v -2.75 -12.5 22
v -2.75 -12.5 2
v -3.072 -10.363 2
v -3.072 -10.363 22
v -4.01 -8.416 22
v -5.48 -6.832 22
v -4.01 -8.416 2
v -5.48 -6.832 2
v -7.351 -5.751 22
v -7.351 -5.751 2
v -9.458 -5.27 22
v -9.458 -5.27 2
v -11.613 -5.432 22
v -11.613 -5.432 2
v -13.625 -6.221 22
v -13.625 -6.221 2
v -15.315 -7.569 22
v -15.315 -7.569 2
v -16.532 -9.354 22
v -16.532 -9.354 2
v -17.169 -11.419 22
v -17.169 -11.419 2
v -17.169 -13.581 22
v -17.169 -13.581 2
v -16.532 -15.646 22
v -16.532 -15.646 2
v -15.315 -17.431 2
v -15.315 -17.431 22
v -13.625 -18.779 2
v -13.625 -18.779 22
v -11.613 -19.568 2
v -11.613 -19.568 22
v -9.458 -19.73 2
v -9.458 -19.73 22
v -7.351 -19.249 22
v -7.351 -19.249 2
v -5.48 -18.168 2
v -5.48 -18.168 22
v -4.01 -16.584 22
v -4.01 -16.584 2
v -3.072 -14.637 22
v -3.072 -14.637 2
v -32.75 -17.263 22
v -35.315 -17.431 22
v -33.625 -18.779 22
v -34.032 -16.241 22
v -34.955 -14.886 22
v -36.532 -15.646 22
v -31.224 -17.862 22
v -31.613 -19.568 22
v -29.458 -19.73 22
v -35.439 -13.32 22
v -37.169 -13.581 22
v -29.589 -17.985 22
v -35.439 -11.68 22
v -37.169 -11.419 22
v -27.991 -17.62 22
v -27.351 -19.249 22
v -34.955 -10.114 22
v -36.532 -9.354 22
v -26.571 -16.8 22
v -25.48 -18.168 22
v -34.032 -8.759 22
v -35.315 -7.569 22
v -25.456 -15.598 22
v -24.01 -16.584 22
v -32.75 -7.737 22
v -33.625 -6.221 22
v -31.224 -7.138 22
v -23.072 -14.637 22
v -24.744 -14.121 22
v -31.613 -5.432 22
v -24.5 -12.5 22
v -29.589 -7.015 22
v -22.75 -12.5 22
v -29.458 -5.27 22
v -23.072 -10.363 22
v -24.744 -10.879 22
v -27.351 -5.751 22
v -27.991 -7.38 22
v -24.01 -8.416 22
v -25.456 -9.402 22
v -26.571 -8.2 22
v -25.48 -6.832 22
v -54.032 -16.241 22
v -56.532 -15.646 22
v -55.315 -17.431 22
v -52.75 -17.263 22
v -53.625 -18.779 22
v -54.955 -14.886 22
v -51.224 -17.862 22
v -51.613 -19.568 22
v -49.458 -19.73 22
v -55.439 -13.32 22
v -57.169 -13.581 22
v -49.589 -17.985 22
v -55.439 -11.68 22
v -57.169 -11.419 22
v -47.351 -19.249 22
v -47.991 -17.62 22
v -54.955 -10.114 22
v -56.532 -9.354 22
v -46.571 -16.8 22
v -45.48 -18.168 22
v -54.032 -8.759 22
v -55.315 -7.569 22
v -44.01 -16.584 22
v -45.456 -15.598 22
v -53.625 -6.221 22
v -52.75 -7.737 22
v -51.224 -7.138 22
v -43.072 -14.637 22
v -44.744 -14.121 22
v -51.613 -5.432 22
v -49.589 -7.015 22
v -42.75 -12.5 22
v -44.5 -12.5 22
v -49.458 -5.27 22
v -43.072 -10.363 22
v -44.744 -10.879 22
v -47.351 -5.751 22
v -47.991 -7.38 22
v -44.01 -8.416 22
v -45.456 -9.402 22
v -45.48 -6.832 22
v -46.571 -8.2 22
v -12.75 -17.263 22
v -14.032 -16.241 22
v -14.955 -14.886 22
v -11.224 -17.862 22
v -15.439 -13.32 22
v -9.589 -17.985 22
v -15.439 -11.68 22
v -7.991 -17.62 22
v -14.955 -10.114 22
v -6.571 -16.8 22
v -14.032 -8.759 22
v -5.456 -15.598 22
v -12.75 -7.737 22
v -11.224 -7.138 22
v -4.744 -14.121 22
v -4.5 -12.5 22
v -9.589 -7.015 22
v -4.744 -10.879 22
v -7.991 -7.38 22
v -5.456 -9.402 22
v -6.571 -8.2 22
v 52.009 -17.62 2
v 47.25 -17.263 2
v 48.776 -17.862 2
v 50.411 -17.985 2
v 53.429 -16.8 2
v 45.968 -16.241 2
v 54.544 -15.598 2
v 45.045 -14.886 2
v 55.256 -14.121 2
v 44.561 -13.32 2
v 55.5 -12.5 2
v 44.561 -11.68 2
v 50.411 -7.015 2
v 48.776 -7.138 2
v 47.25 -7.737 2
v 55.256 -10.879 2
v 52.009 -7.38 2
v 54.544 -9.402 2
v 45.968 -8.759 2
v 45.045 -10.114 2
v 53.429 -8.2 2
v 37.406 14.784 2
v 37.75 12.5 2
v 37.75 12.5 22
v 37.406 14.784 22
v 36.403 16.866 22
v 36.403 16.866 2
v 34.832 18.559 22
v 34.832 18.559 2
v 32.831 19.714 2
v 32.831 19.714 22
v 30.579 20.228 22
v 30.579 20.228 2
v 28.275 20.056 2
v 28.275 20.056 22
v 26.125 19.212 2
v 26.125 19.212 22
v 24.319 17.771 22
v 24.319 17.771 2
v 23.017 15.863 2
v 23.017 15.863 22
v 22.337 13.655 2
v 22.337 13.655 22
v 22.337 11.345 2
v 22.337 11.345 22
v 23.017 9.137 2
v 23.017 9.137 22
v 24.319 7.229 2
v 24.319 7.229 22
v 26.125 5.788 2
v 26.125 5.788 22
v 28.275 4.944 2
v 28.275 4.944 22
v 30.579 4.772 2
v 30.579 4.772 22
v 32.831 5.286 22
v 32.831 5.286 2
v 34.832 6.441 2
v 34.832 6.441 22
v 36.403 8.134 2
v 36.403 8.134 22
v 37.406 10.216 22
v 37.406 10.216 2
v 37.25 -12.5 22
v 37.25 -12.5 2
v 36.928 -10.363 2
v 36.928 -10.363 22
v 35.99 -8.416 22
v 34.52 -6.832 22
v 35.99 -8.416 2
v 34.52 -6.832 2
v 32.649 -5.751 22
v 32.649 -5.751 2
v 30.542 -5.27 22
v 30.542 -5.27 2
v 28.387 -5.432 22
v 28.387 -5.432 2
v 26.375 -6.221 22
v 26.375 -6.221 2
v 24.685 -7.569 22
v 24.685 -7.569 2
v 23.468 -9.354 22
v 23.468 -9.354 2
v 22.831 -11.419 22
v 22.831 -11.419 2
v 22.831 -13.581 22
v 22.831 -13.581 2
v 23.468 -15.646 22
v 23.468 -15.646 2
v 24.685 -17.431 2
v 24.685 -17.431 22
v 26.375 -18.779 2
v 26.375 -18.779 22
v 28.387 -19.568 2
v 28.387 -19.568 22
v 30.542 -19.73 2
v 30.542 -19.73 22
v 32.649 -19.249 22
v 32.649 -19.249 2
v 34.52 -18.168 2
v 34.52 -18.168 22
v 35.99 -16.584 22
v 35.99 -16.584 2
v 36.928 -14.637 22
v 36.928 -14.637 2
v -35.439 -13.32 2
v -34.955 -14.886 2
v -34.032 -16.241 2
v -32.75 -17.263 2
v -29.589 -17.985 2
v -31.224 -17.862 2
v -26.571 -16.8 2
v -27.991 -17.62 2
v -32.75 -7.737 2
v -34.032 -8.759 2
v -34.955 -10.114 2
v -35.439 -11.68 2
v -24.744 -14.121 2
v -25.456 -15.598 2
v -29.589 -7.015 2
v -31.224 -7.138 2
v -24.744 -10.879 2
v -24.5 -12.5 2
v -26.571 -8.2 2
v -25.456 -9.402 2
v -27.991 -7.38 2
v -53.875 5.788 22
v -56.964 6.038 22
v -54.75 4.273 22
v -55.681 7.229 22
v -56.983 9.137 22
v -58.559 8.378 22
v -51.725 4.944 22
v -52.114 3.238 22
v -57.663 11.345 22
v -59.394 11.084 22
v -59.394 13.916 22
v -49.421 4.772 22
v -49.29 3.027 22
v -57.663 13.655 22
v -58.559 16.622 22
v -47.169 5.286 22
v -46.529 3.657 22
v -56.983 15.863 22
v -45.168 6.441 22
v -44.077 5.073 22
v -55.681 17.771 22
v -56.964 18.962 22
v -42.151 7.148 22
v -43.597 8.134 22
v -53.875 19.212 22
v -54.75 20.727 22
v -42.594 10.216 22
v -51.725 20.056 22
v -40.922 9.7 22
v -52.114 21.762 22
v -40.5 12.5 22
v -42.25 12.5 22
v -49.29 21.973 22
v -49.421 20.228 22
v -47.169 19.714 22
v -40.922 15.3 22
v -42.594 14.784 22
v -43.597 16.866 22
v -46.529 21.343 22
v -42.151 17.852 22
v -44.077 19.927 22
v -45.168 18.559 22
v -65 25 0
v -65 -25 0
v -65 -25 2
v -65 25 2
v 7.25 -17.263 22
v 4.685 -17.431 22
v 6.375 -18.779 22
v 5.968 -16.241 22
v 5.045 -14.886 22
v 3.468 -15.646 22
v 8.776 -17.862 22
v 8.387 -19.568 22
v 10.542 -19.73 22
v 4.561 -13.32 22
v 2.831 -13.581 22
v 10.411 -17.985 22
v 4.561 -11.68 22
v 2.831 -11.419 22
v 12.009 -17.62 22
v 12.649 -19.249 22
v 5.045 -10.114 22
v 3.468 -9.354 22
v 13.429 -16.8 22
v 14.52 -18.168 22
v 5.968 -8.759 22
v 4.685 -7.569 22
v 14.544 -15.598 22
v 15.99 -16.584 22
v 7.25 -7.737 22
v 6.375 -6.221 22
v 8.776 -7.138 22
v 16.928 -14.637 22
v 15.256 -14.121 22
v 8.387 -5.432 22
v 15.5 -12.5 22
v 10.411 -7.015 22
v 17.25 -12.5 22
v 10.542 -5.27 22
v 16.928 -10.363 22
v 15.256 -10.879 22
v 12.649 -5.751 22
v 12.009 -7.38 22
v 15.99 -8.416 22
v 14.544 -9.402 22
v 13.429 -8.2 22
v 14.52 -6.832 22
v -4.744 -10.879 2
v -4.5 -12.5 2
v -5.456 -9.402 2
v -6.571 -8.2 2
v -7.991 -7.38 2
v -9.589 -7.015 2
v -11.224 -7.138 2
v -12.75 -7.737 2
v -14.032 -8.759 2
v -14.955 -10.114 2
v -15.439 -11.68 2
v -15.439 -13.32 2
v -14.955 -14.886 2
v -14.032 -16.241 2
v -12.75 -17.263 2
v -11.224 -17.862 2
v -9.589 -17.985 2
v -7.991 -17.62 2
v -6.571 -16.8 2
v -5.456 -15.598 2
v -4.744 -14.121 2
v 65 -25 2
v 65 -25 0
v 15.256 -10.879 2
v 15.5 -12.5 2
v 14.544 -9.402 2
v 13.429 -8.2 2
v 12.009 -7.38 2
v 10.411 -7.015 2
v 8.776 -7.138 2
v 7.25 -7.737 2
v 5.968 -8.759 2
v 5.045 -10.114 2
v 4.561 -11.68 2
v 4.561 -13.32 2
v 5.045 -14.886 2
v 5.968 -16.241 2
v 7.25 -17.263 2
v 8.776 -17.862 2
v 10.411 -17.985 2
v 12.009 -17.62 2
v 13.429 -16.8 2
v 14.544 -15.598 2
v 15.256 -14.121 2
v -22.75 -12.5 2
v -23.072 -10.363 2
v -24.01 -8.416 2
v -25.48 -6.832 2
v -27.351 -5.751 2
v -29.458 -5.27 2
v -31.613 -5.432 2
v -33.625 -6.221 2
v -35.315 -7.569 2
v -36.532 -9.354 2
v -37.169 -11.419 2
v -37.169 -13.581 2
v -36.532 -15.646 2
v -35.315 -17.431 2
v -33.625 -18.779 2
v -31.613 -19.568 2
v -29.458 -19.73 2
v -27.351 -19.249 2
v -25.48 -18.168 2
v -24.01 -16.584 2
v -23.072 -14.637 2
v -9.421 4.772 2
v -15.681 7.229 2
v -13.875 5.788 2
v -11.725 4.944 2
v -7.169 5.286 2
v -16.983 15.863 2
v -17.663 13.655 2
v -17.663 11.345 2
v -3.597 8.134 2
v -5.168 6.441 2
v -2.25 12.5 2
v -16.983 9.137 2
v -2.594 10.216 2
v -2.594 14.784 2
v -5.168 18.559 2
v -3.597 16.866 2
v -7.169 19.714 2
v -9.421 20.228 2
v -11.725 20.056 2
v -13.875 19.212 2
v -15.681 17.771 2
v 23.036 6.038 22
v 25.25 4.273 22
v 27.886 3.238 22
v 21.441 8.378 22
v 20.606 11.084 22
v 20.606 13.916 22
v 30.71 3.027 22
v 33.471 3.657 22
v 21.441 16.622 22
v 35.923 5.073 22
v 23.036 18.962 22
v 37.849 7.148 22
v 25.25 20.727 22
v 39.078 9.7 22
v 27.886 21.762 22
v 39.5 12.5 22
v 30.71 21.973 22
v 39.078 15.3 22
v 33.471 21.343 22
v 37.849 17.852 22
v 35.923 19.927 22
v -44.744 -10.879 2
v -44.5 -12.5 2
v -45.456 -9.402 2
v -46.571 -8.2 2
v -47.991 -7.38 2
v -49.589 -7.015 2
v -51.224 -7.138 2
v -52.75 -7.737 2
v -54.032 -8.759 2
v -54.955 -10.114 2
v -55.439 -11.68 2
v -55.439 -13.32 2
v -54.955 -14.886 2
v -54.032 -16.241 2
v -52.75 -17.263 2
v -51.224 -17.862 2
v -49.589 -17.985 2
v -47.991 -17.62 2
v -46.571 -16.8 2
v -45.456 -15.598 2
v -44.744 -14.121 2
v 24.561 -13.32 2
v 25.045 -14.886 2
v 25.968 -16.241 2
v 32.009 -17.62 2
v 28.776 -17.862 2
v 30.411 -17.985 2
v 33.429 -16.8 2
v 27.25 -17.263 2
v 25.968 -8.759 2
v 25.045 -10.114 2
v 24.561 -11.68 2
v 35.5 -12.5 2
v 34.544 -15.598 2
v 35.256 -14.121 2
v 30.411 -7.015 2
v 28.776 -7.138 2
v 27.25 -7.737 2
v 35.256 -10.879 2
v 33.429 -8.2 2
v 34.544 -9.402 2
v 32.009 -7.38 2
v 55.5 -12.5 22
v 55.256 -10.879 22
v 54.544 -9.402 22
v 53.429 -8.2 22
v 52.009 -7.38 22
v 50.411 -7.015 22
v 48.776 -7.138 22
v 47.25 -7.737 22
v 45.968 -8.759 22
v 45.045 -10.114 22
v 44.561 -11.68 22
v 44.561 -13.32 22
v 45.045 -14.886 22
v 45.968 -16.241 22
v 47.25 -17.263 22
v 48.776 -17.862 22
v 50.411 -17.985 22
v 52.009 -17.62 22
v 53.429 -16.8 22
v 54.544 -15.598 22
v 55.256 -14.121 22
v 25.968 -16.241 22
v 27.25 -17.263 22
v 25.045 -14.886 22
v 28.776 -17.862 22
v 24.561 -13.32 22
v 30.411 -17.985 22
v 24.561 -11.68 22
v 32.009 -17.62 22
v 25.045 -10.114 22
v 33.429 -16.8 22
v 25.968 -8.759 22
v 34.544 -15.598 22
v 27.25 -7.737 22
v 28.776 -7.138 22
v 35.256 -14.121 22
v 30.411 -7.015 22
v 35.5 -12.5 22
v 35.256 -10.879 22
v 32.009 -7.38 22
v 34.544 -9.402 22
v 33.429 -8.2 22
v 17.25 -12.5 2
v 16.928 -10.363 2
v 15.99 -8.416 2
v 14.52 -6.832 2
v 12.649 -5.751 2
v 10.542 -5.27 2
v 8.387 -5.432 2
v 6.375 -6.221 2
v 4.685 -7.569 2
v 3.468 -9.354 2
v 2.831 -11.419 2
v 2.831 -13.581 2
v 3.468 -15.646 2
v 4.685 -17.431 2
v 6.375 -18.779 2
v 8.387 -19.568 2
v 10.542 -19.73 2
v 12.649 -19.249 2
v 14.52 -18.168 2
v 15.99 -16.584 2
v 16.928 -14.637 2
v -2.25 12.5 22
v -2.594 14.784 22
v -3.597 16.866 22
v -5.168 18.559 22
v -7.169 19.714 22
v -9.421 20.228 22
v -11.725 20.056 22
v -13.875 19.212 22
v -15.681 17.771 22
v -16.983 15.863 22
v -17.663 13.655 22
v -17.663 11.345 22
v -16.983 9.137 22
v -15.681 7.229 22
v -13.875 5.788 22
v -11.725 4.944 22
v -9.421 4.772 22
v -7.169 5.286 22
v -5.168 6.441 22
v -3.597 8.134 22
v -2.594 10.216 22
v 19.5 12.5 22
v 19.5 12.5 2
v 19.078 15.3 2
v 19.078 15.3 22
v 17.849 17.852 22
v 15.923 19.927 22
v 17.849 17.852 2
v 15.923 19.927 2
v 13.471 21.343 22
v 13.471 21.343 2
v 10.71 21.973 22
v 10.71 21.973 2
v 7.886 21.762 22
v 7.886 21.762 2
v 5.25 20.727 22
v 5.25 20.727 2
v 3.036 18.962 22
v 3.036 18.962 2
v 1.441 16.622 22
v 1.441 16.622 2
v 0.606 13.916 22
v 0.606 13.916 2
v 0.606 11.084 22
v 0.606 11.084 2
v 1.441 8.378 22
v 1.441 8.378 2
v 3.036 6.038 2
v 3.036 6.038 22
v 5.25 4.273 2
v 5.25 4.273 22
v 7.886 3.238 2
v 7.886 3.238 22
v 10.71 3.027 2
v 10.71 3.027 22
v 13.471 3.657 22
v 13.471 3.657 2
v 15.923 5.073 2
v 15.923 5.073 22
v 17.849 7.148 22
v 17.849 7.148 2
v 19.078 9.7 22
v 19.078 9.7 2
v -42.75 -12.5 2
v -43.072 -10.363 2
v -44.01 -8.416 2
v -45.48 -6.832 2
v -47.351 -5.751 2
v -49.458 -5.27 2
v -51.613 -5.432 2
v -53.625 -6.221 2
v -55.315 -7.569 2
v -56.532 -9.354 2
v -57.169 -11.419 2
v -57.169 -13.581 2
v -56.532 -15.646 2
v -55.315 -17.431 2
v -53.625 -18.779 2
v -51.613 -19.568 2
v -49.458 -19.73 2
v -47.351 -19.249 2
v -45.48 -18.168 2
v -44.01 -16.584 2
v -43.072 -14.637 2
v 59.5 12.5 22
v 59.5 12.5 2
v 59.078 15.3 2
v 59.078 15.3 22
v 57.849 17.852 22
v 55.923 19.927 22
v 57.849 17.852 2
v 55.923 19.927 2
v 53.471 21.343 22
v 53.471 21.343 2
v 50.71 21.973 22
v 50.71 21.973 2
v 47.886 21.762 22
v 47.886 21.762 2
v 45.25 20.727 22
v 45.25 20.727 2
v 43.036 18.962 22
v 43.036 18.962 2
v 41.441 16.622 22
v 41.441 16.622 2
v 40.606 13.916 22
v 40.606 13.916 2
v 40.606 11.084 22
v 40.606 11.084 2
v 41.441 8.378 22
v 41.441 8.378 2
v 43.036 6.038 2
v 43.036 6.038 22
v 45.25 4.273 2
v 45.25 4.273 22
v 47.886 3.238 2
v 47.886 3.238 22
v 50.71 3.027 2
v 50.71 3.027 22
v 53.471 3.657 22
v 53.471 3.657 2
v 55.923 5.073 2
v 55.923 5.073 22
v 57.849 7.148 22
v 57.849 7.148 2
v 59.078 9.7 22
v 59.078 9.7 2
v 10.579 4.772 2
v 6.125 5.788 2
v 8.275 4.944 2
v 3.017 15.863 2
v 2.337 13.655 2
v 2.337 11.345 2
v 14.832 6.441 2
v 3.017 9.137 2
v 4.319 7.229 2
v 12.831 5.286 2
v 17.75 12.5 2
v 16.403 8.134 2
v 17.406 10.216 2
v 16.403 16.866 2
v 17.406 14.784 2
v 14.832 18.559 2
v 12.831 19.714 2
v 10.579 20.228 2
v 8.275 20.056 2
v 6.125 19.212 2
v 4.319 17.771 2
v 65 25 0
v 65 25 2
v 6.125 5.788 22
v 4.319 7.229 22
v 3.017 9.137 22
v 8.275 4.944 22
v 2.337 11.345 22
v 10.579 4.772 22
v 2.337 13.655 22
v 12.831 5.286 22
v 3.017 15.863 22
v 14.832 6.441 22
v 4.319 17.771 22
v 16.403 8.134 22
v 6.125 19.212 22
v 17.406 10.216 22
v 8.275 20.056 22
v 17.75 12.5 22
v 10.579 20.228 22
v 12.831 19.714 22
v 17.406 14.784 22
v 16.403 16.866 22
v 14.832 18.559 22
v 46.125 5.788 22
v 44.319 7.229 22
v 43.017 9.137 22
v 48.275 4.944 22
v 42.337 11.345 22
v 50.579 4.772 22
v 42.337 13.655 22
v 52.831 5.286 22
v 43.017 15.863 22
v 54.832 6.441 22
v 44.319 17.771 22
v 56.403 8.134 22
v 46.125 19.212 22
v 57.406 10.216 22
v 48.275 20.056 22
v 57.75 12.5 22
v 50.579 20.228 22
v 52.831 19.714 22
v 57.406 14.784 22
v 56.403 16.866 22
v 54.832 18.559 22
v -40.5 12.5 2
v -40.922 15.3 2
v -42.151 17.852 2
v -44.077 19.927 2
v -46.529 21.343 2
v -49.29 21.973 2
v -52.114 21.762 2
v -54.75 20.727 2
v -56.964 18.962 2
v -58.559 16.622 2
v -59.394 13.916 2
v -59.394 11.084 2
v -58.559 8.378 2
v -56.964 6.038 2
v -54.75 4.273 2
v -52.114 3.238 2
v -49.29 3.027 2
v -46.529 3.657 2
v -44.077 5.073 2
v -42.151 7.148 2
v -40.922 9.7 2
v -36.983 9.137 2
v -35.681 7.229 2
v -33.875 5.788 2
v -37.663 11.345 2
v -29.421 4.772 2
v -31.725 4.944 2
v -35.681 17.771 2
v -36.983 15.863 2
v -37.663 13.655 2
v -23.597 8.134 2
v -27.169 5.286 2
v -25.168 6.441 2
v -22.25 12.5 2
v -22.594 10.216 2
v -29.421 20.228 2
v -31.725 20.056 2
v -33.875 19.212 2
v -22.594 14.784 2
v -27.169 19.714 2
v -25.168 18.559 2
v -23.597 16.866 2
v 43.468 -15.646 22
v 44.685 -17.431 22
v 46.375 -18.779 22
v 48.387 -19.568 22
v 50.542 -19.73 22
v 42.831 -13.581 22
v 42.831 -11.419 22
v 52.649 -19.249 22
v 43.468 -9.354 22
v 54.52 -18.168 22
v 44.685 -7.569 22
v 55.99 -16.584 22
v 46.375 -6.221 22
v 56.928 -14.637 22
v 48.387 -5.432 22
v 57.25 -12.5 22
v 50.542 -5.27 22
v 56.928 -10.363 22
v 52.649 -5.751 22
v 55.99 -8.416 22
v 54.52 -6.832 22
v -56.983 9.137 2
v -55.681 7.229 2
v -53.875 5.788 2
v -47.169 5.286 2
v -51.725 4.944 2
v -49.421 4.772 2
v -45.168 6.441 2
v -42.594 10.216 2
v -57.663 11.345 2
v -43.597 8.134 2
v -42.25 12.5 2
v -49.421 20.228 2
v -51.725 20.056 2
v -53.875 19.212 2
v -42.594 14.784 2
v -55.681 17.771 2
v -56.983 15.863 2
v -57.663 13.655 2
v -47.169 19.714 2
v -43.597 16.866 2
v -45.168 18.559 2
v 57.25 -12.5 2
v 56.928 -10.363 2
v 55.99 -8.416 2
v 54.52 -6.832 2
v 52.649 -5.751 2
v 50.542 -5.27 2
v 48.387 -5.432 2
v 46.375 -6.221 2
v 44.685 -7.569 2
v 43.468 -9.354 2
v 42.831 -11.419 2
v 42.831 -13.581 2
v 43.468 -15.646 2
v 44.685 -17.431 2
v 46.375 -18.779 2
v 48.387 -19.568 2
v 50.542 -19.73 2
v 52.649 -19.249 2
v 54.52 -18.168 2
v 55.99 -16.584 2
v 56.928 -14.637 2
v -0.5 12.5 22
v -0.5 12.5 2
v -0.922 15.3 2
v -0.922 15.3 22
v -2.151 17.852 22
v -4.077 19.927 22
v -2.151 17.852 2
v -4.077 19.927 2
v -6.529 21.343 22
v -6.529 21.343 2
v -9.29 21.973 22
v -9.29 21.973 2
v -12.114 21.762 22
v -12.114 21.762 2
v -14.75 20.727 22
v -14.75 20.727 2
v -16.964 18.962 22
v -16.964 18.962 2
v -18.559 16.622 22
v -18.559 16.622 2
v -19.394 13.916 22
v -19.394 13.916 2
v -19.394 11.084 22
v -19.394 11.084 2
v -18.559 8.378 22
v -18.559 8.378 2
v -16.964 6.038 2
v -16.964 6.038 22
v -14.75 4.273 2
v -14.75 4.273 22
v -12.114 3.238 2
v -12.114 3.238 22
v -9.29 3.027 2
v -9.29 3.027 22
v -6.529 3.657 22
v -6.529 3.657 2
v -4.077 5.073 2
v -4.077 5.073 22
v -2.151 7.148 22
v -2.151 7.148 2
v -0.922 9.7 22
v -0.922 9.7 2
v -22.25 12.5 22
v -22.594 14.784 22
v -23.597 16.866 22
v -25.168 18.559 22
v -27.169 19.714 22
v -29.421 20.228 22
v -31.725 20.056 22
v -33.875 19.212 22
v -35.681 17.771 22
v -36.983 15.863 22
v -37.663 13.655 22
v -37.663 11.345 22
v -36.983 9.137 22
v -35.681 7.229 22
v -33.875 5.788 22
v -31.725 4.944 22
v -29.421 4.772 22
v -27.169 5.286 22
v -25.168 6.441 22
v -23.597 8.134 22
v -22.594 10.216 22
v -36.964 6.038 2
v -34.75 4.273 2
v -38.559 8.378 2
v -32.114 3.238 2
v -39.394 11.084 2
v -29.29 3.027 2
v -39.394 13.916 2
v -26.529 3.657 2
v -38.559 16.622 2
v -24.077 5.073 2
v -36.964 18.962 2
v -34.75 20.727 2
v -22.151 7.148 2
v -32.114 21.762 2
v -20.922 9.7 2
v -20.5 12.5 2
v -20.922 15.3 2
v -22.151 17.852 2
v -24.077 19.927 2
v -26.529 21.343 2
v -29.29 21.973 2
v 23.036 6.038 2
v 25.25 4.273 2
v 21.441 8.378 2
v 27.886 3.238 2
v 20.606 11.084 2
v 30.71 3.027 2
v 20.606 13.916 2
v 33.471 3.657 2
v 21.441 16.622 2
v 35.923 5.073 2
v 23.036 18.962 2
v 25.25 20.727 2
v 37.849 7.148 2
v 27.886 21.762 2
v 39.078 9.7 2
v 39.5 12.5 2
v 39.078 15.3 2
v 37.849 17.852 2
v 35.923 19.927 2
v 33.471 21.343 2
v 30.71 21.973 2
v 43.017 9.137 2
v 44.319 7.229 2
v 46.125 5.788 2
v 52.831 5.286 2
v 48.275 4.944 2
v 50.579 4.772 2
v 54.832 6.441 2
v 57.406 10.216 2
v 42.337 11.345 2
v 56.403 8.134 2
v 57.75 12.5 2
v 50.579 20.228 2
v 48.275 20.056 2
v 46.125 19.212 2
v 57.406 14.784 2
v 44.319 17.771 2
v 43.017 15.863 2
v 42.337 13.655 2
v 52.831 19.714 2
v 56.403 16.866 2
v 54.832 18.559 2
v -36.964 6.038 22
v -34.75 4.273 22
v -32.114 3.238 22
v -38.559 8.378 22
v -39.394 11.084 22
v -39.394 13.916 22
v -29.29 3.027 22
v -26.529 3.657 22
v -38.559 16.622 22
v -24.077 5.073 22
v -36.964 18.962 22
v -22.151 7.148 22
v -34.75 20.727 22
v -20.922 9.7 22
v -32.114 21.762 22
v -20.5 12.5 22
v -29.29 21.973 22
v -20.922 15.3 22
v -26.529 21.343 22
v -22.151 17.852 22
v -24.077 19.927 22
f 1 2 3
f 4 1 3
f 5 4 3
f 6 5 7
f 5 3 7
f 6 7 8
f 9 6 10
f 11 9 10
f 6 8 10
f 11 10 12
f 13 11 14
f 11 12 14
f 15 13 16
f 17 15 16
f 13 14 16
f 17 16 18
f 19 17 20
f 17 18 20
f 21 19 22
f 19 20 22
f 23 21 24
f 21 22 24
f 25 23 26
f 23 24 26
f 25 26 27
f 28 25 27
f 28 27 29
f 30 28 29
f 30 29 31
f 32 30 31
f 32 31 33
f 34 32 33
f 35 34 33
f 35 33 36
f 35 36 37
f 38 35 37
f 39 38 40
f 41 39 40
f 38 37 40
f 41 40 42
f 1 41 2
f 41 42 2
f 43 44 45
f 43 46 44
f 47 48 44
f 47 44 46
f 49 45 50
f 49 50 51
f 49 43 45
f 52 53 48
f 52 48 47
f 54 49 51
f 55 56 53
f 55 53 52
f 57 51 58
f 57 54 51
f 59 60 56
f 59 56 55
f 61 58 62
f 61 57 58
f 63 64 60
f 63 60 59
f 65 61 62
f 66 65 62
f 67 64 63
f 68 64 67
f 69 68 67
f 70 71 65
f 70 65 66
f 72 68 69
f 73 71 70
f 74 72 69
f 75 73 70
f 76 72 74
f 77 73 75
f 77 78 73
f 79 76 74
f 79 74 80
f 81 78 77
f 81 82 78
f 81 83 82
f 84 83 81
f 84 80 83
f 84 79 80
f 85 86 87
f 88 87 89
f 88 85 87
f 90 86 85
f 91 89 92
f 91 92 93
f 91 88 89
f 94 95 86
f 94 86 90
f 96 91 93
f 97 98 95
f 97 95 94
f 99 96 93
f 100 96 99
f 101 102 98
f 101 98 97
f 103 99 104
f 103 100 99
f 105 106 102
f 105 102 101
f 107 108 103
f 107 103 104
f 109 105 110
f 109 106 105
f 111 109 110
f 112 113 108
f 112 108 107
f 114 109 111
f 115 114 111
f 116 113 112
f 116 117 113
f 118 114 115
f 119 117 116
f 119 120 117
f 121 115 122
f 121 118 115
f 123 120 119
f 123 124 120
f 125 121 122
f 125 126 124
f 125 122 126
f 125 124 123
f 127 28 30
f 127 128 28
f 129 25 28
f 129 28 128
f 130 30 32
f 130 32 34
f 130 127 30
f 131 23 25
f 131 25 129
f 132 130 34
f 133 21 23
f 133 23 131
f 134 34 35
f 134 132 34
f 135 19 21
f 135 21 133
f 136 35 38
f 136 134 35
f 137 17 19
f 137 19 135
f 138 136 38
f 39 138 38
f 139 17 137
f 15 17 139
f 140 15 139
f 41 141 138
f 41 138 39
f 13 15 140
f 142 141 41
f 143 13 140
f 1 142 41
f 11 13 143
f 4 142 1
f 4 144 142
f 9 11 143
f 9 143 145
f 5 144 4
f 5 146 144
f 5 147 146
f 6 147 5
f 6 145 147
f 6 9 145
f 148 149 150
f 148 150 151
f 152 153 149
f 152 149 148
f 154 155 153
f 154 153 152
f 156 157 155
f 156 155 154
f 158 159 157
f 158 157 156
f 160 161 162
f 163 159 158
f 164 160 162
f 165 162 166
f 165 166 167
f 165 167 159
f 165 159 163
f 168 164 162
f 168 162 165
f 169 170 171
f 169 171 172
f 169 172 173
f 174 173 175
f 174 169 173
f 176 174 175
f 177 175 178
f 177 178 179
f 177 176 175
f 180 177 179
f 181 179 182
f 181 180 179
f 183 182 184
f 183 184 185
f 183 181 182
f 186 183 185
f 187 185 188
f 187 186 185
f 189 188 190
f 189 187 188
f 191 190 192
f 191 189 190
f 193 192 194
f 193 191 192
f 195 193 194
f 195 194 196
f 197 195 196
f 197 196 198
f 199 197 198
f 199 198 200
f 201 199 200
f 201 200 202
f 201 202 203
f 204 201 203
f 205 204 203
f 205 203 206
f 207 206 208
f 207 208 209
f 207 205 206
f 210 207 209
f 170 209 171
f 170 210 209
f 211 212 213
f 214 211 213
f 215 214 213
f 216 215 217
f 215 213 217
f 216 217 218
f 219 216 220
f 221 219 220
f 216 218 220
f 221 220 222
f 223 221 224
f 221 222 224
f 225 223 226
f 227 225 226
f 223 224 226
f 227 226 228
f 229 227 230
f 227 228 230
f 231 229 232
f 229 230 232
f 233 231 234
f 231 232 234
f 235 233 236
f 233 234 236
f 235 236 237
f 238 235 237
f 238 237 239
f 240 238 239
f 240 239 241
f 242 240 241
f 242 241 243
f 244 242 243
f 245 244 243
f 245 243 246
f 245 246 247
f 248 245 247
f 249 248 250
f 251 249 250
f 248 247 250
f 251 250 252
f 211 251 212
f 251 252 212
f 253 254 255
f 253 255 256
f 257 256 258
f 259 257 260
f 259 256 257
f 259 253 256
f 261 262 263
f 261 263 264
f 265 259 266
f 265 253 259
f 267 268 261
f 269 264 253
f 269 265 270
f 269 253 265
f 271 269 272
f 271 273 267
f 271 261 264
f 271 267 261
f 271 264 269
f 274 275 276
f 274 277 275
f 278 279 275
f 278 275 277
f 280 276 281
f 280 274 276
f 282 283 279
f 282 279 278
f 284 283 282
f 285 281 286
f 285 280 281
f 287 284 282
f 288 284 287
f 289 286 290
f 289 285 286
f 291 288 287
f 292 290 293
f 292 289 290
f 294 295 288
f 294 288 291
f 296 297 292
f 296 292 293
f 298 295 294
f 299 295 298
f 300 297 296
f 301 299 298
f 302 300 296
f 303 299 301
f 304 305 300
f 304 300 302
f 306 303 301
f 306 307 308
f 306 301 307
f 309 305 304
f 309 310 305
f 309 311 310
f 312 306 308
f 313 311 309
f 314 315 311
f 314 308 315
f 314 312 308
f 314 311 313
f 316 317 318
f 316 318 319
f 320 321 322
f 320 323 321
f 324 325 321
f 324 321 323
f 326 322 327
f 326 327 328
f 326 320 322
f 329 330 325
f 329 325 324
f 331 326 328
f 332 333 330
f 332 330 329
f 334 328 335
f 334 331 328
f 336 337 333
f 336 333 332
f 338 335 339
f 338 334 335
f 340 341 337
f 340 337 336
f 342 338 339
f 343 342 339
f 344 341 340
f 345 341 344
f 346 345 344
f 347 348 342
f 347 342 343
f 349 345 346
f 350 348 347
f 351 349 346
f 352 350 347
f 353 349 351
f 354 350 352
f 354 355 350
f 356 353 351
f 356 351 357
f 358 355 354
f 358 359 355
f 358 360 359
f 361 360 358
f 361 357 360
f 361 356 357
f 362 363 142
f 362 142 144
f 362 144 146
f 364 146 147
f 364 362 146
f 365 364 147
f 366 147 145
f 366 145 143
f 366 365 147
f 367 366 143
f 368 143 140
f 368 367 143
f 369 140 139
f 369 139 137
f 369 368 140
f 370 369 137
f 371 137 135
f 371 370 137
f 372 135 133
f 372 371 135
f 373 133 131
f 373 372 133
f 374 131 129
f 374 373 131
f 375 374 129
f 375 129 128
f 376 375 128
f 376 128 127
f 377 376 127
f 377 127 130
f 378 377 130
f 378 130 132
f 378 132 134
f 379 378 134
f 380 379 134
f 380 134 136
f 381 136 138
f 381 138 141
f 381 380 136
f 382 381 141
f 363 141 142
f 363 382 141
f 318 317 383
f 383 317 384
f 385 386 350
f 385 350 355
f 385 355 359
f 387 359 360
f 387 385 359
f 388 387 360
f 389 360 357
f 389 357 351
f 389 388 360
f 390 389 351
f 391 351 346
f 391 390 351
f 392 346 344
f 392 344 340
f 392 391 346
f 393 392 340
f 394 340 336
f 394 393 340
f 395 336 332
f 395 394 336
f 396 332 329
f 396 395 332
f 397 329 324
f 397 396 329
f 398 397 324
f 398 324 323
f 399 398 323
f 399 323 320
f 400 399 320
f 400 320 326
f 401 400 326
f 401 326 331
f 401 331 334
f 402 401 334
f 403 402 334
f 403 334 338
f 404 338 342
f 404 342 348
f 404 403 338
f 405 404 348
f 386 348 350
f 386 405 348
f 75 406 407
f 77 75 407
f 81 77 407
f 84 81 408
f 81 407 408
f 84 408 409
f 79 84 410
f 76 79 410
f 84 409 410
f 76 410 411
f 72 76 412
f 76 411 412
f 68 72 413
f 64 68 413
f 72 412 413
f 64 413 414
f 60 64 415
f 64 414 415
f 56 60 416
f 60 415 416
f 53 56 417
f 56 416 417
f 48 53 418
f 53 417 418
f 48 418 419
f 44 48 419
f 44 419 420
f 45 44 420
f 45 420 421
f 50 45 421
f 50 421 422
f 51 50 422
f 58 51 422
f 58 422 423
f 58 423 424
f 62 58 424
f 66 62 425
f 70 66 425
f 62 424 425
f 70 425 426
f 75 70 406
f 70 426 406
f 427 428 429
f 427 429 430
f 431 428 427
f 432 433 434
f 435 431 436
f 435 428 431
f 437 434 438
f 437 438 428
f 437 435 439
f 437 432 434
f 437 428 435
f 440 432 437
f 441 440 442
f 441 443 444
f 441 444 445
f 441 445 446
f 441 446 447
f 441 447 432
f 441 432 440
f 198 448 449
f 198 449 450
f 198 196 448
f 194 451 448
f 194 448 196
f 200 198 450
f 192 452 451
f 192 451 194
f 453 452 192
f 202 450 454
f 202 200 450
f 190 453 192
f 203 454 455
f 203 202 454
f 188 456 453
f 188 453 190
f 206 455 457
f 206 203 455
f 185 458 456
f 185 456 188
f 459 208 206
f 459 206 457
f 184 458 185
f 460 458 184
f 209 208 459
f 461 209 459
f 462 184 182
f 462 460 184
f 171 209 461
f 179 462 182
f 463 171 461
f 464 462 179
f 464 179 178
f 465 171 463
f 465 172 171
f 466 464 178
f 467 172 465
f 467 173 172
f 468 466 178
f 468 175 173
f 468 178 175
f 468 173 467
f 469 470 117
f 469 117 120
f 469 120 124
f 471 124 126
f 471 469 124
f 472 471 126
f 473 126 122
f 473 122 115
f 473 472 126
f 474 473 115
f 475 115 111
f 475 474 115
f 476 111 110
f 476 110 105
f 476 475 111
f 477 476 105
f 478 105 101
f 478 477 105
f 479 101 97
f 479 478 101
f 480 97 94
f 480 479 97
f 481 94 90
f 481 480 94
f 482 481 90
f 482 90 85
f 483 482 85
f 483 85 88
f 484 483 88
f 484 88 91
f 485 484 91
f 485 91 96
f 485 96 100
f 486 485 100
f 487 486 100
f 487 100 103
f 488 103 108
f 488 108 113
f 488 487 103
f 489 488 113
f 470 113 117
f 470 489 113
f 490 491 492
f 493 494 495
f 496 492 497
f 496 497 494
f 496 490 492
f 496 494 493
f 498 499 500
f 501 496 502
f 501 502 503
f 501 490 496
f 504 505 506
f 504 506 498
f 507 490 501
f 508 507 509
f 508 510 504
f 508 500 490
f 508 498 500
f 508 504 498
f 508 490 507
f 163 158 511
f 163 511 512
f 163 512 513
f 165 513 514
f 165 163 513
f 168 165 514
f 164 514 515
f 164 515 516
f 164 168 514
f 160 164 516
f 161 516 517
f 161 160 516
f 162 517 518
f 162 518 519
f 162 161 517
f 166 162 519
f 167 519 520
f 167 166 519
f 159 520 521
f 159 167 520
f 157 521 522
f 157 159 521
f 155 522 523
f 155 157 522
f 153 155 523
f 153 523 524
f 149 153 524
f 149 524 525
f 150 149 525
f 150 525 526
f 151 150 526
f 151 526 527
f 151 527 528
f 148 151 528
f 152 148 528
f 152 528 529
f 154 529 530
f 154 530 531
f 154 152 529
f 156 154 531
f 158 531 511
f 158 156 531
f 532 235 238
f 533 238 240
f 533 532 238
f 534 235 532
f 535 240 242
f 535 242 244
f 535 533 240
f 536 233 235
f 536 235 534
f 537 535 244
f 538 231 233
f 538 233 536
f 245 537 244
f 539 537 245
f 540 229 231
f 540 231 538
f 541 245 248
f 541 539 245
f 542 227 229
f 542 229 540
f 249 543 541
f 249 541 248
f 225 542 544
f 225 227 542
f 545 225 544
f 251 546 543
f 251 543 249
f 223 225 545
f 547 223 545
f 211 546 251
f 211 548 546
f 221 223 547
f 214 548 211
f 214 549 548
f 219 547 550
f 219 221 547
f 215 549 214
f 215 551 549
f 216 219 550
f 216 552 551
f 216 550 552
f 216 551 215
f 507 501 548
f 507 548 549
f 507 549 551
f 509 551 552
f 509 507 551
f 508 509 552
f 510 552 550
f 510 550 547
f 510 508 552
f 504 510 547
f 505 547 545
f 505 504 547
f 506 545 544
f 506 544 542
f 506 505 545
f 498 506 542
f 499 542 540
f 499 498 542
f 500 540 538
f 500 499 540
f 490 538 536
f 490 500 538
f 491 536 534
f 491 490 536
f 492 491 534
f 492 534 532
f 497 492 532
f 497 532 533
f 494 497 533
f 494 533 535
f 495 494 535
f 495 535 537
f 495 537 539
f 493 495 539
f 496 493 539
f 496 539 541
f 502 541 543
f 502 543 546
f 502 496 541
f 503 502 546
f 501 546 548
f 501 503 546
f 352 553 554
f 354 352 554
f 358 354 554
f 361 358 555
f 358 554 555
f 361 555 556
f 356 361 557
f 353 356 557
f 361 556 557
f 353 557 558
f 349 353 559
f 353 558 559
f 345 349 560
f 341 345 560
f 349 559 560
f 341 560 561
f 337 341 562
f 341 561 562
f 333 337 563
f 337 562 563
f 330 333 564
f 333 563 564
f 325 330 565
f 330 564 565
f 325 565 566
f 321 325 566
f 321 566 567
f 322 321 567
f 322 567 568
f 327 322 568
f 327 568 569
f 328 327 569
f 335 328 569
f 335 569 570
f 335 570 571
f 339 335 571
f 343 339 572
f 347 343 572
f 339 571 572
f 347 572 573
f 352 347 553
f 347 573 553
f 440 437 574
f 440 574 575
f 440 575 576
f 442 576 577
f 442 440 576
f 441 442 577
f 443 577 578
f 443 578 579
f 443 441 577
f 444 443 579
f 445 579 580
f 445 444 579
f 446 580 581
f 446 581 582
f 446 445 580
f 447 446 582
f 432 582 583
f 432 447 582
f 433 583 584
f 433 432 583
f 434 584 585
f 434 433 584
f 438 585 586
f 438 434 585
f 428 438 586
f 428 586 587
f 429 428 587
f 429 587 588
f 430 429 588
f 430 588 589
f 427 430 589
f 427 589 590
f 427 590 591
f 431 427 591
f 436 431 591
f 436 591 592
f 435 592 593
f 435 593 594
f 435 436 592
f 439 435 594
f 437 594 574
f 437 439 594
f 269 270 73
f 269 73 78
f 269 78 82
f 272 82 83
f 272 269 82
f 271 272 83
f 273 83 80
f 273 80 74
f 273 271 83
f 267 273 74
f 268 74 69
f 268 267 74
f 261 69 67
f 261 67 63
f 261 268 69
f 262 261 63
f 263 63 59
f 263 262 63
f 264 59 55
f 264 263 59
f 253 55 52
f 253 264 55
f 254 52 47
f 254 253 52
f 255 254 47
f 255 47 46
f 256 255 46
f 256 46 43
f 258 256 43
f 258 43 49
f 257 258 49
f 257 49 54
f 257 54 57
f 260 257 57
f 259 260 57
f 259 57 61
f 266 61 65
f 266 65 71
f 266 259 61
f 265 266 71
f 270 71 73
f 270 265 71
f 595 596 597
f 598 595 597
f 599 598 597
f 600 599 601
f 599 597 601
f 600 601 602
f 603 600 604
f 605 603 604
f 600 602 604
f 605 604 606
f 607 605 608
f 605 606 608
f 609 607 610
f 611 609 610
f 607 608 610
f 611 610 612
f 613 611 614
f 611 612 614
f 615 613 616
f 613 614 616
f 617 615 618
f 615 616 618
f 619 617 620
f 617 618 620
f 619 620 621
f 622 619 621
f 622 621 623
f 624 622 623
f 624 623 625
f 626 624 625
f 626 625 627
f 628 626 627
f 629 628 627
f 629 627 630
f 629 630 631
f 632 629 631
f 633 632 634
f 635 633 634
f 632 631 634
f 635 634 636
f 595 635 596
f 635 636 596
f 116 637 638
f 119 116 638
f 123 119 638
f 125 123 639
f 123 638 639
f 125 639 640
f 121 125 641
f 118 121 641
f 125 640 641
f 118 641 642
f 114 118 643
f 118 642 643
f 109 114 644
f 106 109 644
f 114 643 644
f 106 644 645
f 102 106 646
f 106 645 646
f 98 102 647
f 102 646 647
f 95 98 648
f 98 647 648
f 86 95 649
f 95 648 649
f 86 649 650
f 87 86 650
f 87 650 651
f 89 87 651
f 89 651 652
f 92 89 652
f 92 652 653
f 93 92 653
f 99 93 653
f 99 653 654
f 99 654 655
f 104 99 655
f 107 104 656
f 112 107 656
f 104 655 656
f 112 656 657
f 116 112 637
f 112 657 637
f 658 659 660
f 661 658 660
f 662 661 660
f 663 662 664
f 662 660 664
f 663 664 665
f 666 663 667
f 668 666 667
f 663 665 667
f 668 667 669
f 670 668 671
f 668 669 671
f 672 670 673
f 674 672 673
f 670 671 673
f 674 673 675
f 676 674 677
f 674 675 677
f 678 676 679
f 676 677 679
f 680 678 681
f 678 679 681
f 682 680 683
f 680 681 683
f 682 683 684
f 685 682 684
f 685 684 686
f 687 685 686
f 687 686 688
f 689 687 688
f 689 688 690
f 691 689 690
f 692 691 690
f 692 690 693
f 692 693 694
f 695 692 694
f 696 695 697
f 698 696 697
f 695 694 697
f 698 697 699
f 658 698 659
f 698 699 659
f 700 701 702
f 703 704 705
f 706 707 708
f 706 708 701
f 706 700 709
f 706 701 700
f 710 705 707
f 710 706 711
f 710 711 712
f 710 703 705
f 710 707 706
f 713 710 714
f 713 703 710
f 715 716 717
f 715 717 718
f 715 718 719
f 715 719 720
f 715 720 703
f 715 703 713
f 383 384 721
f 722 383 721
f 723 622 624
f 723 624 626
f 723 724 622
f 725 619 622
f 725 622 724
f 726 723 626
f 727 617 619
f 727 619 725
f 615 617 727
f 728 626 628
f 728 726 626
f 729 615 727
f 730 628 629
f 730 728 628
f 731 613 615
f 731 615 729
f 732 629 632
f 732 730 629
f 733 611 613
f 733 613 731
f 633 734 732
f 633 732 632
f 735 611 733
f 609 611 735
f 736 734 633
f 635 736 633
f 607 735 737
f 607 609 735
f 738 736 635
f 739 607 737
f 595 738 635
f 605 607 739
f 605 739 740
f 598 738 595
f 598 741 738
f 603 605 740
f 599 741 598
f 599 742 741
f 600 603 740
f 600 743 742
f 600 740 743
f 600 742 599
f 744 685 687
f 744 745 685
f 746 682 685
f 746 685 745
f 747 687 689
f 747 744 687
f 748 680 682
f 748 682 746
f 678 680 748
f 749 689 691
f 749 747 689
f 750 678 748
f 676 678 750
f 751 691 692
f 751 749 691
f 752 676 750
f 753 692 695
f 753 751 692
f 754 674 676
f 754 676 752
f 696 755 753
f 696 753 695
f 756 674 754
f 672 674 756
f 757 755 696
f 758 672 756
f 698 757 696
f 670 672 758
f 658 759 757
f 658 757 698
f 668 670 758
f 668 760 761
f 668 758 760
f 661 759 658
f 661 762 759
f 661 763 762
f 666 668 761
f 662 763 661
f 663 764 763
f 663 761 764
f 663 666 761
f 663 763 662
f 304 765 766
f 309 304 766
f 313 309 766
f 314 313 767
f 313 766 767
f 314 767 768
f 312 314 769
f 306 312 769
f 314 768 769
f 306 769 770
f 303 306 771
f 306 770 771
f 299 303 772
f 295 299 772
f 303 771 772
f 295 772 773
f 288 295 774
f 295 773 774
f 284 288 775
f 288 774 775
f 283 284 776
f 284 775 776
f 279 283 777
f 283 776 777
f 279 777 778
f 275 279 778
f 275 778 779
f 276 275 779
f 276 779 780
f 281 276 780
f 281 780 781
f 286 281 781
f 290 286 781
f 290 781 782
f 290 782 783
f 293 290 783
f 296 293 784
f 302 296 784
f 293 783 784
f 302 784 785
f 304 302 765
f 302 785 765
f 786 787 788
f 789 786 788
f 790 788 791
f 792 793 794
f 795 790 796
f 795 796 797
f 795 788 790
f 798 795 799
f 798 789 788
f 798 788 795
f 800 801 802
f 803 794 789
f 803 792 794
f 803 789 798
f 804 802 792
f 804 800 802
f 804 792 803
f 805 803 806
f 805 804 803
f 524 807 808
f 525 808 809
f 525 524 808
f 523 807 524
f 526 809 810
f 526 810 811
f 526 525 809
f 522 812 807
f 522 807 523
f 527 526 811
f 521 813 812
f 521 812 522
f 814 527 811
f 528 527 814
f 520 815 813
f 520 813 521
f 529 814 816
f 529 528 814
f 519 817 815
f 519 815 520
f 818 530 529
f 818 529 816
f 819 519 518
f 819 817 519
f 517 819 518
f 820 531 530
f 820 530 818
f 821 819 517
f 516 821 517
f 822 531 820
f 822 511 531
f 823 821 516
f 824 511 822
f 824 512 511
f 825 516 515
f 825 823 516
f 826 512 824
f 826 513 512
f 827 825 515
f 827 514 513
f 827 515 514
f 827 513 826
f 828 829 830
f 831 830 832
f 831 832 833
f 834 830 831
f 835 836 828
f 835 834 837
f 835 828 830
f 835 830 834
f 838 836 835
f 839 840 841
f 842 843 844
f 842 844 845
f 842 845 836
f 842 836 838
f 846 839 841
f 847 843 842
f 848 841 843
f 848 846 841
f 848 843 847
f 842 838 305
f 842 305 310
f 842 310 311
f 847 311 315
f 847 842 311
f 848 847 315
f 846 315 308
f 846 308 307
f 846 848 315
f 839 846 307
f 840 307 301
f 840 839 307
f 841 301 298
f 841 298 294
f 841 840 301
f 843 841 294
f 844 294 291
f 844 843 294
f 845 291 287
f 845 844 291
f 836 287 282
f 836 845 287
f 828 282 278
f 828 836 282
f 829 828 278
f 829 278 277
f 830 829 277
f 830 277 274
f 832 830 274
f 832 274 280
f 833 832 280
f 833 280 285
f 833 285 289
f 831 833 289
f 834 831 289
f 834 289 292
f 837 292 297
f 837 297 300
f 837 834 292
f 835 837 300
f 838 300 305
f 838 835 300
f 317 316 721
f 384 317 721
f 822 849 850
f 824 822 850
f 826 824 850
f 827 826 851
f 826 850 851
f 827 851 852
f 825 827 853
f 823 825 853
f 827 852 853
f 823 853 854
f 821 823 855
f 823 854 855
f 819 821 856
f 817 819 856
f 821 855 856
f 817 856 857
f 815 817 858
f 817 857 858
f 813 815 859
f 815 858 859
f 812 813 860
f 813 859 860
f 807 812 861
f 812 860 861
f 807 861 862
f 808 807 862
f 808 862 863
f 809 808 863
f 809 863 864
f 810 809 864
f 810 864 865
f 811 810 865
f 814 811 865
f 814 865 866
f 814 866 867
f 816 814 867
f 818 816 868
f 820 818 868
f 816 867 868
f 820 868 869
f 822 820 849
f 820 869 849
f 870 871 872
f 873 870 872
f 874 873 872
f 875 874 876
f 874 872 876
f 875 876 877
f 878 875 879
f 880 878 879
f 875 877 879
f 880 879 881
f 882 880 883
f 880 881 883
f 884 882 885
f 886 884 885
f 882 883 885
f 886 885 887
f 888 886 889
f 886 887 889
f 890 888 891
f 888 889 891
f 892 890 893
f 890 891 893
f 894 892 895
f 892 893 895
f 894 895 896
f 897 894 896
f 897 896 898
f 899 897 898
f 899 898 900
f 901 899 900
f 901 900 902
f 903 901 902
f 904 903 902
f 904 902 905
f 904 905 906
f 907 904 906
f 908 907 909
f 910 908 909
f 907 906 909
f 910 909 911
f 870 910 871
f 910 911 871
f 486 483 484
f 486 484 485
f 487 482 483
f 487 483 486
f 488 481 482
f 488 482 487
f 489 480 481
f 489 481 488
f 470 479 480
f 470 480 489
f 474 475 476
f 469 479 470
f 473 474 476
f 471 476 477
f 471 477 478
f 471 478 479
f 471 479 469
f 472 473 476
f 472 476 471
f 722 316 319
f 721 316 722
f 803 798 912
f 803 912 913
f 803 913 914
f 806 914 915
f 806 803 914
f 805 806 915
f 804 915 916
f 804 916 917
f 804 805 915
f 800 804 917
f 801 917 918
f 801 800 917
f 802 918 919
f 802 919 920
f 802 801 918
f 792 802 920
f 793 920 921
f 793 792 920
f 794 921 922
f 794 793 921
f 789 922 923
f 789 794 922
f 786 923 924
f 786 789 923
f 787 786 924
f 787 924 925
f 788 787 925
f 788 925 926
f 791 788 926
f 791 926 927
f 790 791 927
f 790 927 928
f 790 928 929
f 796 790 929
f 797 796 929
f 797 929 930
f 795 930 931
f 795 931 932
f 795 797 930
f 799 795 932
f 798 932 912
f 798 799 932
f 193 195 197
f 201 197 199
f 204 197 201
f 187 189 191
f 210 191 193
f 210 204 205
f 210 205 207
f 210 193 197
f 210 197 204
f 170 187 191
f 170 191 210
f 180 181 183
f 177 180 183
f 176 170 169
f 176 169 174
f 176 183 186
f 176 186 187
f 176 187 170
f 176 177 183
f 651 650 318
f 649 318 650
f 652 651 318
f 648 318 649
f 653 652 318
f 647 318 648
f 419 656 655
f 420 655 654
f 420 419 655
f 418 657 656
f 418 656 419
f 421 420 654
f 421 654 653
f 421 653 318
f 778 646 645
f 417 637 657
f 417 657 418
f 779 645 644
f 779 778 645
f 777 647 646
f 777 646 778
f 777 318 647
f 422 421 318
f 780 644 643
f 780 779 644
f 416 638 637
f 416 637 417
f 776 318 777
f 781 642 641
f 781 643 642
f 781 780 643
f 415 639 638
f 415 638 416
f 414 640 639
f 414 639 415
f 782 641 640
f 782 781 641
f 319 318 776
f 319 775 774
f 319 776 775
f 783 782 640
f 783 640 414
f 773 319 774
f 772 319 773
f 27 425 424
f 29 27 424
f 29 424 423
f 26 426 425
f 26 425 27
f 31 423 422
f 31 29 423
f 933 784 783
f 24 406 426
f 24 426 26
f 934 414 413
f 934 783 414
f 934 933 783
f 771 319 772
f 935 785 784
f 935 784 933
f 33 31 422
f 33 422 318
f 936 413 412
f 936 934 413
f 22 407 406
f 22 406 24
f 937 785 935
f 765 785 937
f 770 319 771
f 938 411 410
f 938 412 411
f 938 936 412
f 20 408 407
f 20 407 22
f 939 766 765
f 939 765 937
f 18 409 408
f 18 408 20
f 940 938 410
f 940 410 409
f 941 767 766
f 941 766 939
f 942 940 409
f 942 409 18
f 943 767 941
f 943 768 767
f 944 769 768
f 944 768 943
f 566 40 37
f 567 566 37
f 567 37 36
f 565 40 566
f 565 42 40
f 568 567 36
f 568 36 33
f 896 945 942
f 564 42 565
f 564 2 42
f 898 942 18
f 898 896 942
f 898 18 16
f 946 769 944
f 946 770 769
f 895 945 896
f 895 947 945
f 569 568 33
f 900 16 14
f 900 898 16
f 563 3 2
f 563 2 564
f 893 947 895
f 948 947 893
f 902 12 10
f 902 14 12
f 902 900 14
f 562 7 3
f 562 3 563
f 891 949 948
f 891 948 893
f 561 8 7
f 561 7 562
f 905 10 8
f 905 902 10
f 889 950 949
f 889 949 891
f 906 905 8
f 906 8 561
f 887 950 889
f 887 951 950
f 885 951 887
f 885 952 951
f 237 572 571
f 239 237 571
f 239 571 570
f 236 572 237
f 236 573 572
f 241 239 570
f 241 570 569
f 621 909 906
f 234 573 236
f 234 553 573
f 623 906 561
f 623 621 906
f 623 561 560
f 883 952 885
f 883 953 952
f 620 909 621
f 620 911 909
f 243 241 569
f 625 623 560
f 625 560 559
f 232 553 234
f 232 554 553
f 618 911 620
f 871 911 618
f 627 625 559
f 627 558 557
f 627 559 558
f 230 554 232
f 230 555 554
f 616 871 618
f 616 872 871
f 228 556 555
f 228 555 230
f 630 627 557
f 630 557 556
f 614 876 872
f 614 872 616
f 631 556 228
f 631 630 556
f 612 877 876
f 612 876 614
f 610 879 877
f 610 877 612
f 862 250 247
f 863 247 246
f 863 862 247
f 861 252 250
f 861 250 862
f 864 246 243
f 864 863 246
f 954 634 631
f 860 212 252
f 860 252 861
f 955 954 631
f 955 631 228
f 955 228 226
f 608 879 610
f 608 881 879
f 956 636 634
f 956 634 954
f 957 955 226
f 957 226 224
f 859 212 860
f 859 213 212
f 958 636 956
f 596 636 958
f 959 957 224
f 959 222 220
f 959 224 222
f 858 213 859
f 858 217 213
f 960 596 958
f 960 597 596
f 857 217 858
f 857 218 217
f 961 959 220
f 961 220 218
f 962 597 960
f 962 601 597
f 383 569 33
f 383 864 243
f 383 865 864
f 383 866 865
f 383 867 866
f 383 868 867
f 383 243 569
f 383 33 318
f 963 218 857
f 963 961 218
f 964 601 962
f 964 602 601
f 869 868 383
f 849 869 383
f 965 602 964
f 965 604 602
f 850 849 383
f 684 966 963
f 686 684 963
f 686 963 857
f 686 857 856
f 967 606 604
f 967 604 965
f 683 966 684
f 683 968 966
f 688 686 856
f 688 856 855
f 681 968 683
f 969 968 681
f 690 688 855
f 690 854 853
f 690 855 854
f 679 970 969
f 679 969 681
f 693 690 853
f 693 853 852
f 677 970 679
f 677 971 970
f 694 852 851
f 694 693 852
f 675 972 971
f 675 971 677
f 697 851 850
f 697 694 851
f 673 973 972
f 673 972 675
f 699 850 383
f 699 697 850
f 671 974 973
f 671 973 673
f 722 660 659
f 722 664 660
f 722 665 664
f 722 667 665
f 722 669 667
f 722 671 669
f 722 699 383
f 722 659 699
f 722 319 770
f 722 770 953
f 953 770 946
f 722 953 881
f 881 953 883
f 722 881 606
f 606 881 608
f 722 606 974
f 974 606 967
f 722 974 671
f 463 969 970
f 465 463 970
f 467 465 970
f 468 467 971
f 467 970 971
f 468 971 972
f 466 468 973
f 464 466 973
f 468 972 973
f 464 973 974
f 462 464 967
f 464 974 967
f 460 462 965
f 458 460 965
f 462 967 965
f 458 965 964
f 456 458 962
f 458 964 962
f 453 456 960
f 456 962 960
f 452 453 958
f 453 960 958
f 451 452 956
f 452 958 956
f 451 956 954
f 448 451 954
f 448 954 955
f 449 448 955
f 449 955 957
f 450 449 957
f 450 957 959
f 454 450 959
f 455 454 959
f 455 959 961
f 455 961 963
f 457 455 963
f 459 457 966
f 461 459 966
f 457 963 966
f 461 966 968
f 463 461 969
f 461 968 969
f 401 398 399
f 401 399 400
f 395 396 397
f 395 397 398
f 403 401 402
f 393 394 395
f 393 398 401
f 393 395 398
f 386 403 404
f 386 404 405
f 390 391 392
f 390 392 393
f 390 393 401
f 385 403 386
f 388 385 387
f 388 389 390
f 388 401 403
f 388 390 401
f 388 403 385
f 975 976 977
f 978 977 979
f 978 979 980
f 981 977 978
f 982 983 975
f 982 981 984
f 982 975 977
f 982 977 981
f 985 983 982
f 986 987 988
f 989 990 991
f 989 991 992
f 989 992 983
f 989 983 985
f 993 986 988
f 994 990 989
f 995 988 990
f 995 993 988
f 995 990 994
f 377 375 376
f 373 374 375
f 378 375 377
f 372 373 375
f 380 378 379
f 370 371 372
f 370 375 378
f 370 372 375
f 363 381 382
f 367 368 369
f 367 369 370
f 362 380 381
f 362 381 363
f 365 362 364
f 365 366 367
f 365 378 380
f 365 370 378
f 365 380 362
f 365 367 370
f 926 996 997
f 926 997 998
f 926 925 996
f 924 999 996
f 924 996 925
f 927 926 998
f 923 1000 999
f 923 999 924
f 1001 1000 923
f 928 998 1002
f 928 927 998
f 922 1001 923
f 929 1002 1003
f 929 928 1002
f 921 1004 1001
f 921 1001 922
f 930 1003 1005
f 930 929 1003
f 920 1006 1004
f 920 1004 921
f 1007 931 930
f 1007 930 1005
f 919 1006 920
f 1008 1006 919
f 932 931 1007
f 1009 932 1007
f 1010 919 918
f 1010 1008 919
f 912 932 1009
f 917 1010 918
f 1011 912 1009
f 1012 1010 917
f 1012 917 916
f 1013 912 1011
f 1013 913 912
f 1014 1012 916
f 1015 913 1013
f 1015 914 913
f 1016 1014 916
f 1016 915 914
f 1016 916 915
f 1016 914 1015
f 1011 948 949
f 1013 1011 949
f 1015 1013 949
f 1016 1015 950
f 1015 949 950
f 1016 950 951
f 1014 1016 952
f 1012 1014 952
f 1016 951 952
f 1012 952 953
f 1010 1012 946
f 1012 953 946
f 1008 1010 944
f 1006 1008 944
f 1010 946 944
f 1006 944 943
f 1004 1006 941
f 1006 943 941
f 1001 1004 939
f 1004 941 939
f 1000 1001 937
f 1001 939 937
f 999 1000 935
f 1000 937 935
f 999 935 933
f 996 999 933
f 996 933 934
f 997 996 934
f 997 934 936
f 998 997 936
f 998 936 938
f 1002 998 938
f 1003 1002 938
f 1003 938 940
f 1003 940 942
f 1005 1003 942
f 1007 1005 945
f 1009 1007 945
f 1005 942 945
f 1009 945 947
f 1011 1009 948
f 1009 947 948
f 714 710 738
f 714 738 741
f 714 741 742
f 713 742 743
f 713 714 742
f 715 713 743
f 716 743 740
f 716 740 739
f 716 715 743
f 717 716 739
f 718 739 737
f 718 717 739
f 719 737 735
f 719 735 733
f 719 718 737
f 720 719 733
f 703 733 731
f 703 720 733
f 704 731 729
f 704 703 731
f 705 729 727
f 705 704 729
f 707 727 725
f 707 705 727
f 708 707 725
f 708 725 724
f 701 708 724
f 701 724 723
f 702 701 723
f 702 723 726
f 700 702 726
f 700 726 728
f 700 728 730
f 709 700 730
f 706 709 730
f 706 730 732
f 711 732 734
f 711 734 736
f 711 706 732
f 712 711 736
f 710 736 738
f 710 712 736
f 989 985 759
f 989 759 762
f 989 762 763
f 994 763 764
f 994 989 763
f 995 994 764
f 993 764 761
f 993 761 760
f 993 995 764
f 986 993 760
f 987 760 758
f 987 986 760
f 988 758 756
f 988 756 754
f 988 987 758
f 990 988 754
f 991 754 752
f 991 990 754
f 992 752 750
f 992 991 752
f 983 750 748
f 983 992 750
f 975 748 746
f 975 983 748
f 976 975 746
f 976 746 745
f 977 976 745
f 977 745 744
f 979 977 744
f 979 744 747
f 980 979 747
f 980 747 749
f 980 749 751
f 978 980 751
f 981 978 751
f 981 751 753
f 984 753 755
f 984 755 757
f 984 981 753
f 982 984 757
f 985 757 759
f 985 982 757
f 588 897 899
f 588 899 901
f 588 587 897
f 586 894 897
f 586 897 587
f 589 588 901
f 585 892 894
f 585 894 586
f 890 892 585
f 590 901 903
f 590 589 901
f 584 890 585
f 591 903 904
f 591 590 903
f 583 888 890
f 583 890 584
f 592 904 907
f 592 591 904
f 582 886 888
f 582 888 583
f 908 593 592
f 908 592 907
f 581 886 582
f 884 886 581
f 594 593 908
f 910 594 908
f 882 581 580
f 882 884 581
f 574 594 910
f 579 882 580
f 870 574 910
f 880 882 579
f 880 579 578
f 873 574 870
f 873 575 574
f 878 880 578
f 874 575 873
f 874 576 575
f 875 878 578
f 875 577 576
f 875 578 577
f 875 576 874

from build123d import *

# Parameters (mm, degrees)
SKETCH_W      = 130
SKETCH_H      = 50
PAD_DEPTH     = 2
SKETCH001_R   = 9.5
SKETCH001_R_2 = 7.75
SKETCH001_R_3 = 7.25
SKETCH001_R_4 = 5.5
PAD001_DEPTH  = 20


with BuildPart() as part:
    # Sketch → Pad (new body)
    with BuildSketch(Plane.XY):
        Rectangle(SKETCH_W, SKETCH_H)
    extrude(amount=PAD_DEPTH)

    # Sketch001 (on Face6 of Pad) → Pad001 (join)
    with BuildSketch(Plane.XY.offset(2)):
        with Locations((-50, 12.5)):
            Circle(SKETCH001_R)
        with Locations((-50, 12.5)):
            Circle(SKETCH001_R_2, mode=Mode.SUBTRACT)
        with Locations((-30, 12.5)):
            Circle(SKETCH001_R)
        with Locations((-30, 12.5)):
            Circle(SKETCH001_R_2, mode=Mode.SUBTRACT)
        with Locations((-10, 12.5)):
            Circle(SKETCH001_R)
        with Locations((-10, 12.5)):
            Circle(SKETCH001_R_2, mode=Mode.SUBTRACT)
        with Locations((10, 12.5)):
            Circle(SKETCH001_R)
        with Locations((10, 12.5)):
            Circle(SKETCH001_R_2, mode=Mode.SUBTRACT)
        with Locations((30, 12.5)):
            Circle(SKETCH001_R)
        with Locations((30, 12.5)):
            Circle(SKETCH001_R_2, mode=Mode.SUBTRACT)
        with Locations((50, 12.5)):
            Circle(SKETCH001_R)
        with Locations((50, 12.5)):
            Circle(SKETCH001_R_2, mode=Mode.SUBTRACT)
        with Locations((-50, -12.5)):
            Circle(SKETCH001_R_3)
        with Locations((-50, -12.5)):
            Circle(SKETCH001_R_4, mode=Mode.SUBTRACT)
        with Locations((-30, -12.5)):
            Circle(SKETCH001_R_3)
        with Locations((-30, -12.5)):
            Circle(SKETCH001_R_4, mode=Mode.SUBTRACT)
        with Locations((-10, -12.5)):
            Circle(SKETCH001_R_3)
        with Locations((-10, -12.5)):
            Circle(SKETCH001_R_4, mode=Mode.SUBTRACT)
        with Locations((10, -12.5)):
            Circle(SKETCH001_R_3)
        with Locations((10, -12.5)):
            Circle(SKETCH001_R_4, mode=Mode.SUBTRACT)
        with Locations((30, -12.5)):
            Circle(SKETCH001_R_3)
        with Locations((30, -12.5)):
            Circle(SKETCH001_R_4, mode=Mode.SUBTRACT)
        with Locations((50, -12.5)):
            Circle(SKETCH001_R_3)
        with Locations((50, -12.5)):
            Circle(SKETCH001_R_4, mode=Mode.SUBTRACT)
    extrude(amount=PAD001_DEPTH)


solid = part.part
